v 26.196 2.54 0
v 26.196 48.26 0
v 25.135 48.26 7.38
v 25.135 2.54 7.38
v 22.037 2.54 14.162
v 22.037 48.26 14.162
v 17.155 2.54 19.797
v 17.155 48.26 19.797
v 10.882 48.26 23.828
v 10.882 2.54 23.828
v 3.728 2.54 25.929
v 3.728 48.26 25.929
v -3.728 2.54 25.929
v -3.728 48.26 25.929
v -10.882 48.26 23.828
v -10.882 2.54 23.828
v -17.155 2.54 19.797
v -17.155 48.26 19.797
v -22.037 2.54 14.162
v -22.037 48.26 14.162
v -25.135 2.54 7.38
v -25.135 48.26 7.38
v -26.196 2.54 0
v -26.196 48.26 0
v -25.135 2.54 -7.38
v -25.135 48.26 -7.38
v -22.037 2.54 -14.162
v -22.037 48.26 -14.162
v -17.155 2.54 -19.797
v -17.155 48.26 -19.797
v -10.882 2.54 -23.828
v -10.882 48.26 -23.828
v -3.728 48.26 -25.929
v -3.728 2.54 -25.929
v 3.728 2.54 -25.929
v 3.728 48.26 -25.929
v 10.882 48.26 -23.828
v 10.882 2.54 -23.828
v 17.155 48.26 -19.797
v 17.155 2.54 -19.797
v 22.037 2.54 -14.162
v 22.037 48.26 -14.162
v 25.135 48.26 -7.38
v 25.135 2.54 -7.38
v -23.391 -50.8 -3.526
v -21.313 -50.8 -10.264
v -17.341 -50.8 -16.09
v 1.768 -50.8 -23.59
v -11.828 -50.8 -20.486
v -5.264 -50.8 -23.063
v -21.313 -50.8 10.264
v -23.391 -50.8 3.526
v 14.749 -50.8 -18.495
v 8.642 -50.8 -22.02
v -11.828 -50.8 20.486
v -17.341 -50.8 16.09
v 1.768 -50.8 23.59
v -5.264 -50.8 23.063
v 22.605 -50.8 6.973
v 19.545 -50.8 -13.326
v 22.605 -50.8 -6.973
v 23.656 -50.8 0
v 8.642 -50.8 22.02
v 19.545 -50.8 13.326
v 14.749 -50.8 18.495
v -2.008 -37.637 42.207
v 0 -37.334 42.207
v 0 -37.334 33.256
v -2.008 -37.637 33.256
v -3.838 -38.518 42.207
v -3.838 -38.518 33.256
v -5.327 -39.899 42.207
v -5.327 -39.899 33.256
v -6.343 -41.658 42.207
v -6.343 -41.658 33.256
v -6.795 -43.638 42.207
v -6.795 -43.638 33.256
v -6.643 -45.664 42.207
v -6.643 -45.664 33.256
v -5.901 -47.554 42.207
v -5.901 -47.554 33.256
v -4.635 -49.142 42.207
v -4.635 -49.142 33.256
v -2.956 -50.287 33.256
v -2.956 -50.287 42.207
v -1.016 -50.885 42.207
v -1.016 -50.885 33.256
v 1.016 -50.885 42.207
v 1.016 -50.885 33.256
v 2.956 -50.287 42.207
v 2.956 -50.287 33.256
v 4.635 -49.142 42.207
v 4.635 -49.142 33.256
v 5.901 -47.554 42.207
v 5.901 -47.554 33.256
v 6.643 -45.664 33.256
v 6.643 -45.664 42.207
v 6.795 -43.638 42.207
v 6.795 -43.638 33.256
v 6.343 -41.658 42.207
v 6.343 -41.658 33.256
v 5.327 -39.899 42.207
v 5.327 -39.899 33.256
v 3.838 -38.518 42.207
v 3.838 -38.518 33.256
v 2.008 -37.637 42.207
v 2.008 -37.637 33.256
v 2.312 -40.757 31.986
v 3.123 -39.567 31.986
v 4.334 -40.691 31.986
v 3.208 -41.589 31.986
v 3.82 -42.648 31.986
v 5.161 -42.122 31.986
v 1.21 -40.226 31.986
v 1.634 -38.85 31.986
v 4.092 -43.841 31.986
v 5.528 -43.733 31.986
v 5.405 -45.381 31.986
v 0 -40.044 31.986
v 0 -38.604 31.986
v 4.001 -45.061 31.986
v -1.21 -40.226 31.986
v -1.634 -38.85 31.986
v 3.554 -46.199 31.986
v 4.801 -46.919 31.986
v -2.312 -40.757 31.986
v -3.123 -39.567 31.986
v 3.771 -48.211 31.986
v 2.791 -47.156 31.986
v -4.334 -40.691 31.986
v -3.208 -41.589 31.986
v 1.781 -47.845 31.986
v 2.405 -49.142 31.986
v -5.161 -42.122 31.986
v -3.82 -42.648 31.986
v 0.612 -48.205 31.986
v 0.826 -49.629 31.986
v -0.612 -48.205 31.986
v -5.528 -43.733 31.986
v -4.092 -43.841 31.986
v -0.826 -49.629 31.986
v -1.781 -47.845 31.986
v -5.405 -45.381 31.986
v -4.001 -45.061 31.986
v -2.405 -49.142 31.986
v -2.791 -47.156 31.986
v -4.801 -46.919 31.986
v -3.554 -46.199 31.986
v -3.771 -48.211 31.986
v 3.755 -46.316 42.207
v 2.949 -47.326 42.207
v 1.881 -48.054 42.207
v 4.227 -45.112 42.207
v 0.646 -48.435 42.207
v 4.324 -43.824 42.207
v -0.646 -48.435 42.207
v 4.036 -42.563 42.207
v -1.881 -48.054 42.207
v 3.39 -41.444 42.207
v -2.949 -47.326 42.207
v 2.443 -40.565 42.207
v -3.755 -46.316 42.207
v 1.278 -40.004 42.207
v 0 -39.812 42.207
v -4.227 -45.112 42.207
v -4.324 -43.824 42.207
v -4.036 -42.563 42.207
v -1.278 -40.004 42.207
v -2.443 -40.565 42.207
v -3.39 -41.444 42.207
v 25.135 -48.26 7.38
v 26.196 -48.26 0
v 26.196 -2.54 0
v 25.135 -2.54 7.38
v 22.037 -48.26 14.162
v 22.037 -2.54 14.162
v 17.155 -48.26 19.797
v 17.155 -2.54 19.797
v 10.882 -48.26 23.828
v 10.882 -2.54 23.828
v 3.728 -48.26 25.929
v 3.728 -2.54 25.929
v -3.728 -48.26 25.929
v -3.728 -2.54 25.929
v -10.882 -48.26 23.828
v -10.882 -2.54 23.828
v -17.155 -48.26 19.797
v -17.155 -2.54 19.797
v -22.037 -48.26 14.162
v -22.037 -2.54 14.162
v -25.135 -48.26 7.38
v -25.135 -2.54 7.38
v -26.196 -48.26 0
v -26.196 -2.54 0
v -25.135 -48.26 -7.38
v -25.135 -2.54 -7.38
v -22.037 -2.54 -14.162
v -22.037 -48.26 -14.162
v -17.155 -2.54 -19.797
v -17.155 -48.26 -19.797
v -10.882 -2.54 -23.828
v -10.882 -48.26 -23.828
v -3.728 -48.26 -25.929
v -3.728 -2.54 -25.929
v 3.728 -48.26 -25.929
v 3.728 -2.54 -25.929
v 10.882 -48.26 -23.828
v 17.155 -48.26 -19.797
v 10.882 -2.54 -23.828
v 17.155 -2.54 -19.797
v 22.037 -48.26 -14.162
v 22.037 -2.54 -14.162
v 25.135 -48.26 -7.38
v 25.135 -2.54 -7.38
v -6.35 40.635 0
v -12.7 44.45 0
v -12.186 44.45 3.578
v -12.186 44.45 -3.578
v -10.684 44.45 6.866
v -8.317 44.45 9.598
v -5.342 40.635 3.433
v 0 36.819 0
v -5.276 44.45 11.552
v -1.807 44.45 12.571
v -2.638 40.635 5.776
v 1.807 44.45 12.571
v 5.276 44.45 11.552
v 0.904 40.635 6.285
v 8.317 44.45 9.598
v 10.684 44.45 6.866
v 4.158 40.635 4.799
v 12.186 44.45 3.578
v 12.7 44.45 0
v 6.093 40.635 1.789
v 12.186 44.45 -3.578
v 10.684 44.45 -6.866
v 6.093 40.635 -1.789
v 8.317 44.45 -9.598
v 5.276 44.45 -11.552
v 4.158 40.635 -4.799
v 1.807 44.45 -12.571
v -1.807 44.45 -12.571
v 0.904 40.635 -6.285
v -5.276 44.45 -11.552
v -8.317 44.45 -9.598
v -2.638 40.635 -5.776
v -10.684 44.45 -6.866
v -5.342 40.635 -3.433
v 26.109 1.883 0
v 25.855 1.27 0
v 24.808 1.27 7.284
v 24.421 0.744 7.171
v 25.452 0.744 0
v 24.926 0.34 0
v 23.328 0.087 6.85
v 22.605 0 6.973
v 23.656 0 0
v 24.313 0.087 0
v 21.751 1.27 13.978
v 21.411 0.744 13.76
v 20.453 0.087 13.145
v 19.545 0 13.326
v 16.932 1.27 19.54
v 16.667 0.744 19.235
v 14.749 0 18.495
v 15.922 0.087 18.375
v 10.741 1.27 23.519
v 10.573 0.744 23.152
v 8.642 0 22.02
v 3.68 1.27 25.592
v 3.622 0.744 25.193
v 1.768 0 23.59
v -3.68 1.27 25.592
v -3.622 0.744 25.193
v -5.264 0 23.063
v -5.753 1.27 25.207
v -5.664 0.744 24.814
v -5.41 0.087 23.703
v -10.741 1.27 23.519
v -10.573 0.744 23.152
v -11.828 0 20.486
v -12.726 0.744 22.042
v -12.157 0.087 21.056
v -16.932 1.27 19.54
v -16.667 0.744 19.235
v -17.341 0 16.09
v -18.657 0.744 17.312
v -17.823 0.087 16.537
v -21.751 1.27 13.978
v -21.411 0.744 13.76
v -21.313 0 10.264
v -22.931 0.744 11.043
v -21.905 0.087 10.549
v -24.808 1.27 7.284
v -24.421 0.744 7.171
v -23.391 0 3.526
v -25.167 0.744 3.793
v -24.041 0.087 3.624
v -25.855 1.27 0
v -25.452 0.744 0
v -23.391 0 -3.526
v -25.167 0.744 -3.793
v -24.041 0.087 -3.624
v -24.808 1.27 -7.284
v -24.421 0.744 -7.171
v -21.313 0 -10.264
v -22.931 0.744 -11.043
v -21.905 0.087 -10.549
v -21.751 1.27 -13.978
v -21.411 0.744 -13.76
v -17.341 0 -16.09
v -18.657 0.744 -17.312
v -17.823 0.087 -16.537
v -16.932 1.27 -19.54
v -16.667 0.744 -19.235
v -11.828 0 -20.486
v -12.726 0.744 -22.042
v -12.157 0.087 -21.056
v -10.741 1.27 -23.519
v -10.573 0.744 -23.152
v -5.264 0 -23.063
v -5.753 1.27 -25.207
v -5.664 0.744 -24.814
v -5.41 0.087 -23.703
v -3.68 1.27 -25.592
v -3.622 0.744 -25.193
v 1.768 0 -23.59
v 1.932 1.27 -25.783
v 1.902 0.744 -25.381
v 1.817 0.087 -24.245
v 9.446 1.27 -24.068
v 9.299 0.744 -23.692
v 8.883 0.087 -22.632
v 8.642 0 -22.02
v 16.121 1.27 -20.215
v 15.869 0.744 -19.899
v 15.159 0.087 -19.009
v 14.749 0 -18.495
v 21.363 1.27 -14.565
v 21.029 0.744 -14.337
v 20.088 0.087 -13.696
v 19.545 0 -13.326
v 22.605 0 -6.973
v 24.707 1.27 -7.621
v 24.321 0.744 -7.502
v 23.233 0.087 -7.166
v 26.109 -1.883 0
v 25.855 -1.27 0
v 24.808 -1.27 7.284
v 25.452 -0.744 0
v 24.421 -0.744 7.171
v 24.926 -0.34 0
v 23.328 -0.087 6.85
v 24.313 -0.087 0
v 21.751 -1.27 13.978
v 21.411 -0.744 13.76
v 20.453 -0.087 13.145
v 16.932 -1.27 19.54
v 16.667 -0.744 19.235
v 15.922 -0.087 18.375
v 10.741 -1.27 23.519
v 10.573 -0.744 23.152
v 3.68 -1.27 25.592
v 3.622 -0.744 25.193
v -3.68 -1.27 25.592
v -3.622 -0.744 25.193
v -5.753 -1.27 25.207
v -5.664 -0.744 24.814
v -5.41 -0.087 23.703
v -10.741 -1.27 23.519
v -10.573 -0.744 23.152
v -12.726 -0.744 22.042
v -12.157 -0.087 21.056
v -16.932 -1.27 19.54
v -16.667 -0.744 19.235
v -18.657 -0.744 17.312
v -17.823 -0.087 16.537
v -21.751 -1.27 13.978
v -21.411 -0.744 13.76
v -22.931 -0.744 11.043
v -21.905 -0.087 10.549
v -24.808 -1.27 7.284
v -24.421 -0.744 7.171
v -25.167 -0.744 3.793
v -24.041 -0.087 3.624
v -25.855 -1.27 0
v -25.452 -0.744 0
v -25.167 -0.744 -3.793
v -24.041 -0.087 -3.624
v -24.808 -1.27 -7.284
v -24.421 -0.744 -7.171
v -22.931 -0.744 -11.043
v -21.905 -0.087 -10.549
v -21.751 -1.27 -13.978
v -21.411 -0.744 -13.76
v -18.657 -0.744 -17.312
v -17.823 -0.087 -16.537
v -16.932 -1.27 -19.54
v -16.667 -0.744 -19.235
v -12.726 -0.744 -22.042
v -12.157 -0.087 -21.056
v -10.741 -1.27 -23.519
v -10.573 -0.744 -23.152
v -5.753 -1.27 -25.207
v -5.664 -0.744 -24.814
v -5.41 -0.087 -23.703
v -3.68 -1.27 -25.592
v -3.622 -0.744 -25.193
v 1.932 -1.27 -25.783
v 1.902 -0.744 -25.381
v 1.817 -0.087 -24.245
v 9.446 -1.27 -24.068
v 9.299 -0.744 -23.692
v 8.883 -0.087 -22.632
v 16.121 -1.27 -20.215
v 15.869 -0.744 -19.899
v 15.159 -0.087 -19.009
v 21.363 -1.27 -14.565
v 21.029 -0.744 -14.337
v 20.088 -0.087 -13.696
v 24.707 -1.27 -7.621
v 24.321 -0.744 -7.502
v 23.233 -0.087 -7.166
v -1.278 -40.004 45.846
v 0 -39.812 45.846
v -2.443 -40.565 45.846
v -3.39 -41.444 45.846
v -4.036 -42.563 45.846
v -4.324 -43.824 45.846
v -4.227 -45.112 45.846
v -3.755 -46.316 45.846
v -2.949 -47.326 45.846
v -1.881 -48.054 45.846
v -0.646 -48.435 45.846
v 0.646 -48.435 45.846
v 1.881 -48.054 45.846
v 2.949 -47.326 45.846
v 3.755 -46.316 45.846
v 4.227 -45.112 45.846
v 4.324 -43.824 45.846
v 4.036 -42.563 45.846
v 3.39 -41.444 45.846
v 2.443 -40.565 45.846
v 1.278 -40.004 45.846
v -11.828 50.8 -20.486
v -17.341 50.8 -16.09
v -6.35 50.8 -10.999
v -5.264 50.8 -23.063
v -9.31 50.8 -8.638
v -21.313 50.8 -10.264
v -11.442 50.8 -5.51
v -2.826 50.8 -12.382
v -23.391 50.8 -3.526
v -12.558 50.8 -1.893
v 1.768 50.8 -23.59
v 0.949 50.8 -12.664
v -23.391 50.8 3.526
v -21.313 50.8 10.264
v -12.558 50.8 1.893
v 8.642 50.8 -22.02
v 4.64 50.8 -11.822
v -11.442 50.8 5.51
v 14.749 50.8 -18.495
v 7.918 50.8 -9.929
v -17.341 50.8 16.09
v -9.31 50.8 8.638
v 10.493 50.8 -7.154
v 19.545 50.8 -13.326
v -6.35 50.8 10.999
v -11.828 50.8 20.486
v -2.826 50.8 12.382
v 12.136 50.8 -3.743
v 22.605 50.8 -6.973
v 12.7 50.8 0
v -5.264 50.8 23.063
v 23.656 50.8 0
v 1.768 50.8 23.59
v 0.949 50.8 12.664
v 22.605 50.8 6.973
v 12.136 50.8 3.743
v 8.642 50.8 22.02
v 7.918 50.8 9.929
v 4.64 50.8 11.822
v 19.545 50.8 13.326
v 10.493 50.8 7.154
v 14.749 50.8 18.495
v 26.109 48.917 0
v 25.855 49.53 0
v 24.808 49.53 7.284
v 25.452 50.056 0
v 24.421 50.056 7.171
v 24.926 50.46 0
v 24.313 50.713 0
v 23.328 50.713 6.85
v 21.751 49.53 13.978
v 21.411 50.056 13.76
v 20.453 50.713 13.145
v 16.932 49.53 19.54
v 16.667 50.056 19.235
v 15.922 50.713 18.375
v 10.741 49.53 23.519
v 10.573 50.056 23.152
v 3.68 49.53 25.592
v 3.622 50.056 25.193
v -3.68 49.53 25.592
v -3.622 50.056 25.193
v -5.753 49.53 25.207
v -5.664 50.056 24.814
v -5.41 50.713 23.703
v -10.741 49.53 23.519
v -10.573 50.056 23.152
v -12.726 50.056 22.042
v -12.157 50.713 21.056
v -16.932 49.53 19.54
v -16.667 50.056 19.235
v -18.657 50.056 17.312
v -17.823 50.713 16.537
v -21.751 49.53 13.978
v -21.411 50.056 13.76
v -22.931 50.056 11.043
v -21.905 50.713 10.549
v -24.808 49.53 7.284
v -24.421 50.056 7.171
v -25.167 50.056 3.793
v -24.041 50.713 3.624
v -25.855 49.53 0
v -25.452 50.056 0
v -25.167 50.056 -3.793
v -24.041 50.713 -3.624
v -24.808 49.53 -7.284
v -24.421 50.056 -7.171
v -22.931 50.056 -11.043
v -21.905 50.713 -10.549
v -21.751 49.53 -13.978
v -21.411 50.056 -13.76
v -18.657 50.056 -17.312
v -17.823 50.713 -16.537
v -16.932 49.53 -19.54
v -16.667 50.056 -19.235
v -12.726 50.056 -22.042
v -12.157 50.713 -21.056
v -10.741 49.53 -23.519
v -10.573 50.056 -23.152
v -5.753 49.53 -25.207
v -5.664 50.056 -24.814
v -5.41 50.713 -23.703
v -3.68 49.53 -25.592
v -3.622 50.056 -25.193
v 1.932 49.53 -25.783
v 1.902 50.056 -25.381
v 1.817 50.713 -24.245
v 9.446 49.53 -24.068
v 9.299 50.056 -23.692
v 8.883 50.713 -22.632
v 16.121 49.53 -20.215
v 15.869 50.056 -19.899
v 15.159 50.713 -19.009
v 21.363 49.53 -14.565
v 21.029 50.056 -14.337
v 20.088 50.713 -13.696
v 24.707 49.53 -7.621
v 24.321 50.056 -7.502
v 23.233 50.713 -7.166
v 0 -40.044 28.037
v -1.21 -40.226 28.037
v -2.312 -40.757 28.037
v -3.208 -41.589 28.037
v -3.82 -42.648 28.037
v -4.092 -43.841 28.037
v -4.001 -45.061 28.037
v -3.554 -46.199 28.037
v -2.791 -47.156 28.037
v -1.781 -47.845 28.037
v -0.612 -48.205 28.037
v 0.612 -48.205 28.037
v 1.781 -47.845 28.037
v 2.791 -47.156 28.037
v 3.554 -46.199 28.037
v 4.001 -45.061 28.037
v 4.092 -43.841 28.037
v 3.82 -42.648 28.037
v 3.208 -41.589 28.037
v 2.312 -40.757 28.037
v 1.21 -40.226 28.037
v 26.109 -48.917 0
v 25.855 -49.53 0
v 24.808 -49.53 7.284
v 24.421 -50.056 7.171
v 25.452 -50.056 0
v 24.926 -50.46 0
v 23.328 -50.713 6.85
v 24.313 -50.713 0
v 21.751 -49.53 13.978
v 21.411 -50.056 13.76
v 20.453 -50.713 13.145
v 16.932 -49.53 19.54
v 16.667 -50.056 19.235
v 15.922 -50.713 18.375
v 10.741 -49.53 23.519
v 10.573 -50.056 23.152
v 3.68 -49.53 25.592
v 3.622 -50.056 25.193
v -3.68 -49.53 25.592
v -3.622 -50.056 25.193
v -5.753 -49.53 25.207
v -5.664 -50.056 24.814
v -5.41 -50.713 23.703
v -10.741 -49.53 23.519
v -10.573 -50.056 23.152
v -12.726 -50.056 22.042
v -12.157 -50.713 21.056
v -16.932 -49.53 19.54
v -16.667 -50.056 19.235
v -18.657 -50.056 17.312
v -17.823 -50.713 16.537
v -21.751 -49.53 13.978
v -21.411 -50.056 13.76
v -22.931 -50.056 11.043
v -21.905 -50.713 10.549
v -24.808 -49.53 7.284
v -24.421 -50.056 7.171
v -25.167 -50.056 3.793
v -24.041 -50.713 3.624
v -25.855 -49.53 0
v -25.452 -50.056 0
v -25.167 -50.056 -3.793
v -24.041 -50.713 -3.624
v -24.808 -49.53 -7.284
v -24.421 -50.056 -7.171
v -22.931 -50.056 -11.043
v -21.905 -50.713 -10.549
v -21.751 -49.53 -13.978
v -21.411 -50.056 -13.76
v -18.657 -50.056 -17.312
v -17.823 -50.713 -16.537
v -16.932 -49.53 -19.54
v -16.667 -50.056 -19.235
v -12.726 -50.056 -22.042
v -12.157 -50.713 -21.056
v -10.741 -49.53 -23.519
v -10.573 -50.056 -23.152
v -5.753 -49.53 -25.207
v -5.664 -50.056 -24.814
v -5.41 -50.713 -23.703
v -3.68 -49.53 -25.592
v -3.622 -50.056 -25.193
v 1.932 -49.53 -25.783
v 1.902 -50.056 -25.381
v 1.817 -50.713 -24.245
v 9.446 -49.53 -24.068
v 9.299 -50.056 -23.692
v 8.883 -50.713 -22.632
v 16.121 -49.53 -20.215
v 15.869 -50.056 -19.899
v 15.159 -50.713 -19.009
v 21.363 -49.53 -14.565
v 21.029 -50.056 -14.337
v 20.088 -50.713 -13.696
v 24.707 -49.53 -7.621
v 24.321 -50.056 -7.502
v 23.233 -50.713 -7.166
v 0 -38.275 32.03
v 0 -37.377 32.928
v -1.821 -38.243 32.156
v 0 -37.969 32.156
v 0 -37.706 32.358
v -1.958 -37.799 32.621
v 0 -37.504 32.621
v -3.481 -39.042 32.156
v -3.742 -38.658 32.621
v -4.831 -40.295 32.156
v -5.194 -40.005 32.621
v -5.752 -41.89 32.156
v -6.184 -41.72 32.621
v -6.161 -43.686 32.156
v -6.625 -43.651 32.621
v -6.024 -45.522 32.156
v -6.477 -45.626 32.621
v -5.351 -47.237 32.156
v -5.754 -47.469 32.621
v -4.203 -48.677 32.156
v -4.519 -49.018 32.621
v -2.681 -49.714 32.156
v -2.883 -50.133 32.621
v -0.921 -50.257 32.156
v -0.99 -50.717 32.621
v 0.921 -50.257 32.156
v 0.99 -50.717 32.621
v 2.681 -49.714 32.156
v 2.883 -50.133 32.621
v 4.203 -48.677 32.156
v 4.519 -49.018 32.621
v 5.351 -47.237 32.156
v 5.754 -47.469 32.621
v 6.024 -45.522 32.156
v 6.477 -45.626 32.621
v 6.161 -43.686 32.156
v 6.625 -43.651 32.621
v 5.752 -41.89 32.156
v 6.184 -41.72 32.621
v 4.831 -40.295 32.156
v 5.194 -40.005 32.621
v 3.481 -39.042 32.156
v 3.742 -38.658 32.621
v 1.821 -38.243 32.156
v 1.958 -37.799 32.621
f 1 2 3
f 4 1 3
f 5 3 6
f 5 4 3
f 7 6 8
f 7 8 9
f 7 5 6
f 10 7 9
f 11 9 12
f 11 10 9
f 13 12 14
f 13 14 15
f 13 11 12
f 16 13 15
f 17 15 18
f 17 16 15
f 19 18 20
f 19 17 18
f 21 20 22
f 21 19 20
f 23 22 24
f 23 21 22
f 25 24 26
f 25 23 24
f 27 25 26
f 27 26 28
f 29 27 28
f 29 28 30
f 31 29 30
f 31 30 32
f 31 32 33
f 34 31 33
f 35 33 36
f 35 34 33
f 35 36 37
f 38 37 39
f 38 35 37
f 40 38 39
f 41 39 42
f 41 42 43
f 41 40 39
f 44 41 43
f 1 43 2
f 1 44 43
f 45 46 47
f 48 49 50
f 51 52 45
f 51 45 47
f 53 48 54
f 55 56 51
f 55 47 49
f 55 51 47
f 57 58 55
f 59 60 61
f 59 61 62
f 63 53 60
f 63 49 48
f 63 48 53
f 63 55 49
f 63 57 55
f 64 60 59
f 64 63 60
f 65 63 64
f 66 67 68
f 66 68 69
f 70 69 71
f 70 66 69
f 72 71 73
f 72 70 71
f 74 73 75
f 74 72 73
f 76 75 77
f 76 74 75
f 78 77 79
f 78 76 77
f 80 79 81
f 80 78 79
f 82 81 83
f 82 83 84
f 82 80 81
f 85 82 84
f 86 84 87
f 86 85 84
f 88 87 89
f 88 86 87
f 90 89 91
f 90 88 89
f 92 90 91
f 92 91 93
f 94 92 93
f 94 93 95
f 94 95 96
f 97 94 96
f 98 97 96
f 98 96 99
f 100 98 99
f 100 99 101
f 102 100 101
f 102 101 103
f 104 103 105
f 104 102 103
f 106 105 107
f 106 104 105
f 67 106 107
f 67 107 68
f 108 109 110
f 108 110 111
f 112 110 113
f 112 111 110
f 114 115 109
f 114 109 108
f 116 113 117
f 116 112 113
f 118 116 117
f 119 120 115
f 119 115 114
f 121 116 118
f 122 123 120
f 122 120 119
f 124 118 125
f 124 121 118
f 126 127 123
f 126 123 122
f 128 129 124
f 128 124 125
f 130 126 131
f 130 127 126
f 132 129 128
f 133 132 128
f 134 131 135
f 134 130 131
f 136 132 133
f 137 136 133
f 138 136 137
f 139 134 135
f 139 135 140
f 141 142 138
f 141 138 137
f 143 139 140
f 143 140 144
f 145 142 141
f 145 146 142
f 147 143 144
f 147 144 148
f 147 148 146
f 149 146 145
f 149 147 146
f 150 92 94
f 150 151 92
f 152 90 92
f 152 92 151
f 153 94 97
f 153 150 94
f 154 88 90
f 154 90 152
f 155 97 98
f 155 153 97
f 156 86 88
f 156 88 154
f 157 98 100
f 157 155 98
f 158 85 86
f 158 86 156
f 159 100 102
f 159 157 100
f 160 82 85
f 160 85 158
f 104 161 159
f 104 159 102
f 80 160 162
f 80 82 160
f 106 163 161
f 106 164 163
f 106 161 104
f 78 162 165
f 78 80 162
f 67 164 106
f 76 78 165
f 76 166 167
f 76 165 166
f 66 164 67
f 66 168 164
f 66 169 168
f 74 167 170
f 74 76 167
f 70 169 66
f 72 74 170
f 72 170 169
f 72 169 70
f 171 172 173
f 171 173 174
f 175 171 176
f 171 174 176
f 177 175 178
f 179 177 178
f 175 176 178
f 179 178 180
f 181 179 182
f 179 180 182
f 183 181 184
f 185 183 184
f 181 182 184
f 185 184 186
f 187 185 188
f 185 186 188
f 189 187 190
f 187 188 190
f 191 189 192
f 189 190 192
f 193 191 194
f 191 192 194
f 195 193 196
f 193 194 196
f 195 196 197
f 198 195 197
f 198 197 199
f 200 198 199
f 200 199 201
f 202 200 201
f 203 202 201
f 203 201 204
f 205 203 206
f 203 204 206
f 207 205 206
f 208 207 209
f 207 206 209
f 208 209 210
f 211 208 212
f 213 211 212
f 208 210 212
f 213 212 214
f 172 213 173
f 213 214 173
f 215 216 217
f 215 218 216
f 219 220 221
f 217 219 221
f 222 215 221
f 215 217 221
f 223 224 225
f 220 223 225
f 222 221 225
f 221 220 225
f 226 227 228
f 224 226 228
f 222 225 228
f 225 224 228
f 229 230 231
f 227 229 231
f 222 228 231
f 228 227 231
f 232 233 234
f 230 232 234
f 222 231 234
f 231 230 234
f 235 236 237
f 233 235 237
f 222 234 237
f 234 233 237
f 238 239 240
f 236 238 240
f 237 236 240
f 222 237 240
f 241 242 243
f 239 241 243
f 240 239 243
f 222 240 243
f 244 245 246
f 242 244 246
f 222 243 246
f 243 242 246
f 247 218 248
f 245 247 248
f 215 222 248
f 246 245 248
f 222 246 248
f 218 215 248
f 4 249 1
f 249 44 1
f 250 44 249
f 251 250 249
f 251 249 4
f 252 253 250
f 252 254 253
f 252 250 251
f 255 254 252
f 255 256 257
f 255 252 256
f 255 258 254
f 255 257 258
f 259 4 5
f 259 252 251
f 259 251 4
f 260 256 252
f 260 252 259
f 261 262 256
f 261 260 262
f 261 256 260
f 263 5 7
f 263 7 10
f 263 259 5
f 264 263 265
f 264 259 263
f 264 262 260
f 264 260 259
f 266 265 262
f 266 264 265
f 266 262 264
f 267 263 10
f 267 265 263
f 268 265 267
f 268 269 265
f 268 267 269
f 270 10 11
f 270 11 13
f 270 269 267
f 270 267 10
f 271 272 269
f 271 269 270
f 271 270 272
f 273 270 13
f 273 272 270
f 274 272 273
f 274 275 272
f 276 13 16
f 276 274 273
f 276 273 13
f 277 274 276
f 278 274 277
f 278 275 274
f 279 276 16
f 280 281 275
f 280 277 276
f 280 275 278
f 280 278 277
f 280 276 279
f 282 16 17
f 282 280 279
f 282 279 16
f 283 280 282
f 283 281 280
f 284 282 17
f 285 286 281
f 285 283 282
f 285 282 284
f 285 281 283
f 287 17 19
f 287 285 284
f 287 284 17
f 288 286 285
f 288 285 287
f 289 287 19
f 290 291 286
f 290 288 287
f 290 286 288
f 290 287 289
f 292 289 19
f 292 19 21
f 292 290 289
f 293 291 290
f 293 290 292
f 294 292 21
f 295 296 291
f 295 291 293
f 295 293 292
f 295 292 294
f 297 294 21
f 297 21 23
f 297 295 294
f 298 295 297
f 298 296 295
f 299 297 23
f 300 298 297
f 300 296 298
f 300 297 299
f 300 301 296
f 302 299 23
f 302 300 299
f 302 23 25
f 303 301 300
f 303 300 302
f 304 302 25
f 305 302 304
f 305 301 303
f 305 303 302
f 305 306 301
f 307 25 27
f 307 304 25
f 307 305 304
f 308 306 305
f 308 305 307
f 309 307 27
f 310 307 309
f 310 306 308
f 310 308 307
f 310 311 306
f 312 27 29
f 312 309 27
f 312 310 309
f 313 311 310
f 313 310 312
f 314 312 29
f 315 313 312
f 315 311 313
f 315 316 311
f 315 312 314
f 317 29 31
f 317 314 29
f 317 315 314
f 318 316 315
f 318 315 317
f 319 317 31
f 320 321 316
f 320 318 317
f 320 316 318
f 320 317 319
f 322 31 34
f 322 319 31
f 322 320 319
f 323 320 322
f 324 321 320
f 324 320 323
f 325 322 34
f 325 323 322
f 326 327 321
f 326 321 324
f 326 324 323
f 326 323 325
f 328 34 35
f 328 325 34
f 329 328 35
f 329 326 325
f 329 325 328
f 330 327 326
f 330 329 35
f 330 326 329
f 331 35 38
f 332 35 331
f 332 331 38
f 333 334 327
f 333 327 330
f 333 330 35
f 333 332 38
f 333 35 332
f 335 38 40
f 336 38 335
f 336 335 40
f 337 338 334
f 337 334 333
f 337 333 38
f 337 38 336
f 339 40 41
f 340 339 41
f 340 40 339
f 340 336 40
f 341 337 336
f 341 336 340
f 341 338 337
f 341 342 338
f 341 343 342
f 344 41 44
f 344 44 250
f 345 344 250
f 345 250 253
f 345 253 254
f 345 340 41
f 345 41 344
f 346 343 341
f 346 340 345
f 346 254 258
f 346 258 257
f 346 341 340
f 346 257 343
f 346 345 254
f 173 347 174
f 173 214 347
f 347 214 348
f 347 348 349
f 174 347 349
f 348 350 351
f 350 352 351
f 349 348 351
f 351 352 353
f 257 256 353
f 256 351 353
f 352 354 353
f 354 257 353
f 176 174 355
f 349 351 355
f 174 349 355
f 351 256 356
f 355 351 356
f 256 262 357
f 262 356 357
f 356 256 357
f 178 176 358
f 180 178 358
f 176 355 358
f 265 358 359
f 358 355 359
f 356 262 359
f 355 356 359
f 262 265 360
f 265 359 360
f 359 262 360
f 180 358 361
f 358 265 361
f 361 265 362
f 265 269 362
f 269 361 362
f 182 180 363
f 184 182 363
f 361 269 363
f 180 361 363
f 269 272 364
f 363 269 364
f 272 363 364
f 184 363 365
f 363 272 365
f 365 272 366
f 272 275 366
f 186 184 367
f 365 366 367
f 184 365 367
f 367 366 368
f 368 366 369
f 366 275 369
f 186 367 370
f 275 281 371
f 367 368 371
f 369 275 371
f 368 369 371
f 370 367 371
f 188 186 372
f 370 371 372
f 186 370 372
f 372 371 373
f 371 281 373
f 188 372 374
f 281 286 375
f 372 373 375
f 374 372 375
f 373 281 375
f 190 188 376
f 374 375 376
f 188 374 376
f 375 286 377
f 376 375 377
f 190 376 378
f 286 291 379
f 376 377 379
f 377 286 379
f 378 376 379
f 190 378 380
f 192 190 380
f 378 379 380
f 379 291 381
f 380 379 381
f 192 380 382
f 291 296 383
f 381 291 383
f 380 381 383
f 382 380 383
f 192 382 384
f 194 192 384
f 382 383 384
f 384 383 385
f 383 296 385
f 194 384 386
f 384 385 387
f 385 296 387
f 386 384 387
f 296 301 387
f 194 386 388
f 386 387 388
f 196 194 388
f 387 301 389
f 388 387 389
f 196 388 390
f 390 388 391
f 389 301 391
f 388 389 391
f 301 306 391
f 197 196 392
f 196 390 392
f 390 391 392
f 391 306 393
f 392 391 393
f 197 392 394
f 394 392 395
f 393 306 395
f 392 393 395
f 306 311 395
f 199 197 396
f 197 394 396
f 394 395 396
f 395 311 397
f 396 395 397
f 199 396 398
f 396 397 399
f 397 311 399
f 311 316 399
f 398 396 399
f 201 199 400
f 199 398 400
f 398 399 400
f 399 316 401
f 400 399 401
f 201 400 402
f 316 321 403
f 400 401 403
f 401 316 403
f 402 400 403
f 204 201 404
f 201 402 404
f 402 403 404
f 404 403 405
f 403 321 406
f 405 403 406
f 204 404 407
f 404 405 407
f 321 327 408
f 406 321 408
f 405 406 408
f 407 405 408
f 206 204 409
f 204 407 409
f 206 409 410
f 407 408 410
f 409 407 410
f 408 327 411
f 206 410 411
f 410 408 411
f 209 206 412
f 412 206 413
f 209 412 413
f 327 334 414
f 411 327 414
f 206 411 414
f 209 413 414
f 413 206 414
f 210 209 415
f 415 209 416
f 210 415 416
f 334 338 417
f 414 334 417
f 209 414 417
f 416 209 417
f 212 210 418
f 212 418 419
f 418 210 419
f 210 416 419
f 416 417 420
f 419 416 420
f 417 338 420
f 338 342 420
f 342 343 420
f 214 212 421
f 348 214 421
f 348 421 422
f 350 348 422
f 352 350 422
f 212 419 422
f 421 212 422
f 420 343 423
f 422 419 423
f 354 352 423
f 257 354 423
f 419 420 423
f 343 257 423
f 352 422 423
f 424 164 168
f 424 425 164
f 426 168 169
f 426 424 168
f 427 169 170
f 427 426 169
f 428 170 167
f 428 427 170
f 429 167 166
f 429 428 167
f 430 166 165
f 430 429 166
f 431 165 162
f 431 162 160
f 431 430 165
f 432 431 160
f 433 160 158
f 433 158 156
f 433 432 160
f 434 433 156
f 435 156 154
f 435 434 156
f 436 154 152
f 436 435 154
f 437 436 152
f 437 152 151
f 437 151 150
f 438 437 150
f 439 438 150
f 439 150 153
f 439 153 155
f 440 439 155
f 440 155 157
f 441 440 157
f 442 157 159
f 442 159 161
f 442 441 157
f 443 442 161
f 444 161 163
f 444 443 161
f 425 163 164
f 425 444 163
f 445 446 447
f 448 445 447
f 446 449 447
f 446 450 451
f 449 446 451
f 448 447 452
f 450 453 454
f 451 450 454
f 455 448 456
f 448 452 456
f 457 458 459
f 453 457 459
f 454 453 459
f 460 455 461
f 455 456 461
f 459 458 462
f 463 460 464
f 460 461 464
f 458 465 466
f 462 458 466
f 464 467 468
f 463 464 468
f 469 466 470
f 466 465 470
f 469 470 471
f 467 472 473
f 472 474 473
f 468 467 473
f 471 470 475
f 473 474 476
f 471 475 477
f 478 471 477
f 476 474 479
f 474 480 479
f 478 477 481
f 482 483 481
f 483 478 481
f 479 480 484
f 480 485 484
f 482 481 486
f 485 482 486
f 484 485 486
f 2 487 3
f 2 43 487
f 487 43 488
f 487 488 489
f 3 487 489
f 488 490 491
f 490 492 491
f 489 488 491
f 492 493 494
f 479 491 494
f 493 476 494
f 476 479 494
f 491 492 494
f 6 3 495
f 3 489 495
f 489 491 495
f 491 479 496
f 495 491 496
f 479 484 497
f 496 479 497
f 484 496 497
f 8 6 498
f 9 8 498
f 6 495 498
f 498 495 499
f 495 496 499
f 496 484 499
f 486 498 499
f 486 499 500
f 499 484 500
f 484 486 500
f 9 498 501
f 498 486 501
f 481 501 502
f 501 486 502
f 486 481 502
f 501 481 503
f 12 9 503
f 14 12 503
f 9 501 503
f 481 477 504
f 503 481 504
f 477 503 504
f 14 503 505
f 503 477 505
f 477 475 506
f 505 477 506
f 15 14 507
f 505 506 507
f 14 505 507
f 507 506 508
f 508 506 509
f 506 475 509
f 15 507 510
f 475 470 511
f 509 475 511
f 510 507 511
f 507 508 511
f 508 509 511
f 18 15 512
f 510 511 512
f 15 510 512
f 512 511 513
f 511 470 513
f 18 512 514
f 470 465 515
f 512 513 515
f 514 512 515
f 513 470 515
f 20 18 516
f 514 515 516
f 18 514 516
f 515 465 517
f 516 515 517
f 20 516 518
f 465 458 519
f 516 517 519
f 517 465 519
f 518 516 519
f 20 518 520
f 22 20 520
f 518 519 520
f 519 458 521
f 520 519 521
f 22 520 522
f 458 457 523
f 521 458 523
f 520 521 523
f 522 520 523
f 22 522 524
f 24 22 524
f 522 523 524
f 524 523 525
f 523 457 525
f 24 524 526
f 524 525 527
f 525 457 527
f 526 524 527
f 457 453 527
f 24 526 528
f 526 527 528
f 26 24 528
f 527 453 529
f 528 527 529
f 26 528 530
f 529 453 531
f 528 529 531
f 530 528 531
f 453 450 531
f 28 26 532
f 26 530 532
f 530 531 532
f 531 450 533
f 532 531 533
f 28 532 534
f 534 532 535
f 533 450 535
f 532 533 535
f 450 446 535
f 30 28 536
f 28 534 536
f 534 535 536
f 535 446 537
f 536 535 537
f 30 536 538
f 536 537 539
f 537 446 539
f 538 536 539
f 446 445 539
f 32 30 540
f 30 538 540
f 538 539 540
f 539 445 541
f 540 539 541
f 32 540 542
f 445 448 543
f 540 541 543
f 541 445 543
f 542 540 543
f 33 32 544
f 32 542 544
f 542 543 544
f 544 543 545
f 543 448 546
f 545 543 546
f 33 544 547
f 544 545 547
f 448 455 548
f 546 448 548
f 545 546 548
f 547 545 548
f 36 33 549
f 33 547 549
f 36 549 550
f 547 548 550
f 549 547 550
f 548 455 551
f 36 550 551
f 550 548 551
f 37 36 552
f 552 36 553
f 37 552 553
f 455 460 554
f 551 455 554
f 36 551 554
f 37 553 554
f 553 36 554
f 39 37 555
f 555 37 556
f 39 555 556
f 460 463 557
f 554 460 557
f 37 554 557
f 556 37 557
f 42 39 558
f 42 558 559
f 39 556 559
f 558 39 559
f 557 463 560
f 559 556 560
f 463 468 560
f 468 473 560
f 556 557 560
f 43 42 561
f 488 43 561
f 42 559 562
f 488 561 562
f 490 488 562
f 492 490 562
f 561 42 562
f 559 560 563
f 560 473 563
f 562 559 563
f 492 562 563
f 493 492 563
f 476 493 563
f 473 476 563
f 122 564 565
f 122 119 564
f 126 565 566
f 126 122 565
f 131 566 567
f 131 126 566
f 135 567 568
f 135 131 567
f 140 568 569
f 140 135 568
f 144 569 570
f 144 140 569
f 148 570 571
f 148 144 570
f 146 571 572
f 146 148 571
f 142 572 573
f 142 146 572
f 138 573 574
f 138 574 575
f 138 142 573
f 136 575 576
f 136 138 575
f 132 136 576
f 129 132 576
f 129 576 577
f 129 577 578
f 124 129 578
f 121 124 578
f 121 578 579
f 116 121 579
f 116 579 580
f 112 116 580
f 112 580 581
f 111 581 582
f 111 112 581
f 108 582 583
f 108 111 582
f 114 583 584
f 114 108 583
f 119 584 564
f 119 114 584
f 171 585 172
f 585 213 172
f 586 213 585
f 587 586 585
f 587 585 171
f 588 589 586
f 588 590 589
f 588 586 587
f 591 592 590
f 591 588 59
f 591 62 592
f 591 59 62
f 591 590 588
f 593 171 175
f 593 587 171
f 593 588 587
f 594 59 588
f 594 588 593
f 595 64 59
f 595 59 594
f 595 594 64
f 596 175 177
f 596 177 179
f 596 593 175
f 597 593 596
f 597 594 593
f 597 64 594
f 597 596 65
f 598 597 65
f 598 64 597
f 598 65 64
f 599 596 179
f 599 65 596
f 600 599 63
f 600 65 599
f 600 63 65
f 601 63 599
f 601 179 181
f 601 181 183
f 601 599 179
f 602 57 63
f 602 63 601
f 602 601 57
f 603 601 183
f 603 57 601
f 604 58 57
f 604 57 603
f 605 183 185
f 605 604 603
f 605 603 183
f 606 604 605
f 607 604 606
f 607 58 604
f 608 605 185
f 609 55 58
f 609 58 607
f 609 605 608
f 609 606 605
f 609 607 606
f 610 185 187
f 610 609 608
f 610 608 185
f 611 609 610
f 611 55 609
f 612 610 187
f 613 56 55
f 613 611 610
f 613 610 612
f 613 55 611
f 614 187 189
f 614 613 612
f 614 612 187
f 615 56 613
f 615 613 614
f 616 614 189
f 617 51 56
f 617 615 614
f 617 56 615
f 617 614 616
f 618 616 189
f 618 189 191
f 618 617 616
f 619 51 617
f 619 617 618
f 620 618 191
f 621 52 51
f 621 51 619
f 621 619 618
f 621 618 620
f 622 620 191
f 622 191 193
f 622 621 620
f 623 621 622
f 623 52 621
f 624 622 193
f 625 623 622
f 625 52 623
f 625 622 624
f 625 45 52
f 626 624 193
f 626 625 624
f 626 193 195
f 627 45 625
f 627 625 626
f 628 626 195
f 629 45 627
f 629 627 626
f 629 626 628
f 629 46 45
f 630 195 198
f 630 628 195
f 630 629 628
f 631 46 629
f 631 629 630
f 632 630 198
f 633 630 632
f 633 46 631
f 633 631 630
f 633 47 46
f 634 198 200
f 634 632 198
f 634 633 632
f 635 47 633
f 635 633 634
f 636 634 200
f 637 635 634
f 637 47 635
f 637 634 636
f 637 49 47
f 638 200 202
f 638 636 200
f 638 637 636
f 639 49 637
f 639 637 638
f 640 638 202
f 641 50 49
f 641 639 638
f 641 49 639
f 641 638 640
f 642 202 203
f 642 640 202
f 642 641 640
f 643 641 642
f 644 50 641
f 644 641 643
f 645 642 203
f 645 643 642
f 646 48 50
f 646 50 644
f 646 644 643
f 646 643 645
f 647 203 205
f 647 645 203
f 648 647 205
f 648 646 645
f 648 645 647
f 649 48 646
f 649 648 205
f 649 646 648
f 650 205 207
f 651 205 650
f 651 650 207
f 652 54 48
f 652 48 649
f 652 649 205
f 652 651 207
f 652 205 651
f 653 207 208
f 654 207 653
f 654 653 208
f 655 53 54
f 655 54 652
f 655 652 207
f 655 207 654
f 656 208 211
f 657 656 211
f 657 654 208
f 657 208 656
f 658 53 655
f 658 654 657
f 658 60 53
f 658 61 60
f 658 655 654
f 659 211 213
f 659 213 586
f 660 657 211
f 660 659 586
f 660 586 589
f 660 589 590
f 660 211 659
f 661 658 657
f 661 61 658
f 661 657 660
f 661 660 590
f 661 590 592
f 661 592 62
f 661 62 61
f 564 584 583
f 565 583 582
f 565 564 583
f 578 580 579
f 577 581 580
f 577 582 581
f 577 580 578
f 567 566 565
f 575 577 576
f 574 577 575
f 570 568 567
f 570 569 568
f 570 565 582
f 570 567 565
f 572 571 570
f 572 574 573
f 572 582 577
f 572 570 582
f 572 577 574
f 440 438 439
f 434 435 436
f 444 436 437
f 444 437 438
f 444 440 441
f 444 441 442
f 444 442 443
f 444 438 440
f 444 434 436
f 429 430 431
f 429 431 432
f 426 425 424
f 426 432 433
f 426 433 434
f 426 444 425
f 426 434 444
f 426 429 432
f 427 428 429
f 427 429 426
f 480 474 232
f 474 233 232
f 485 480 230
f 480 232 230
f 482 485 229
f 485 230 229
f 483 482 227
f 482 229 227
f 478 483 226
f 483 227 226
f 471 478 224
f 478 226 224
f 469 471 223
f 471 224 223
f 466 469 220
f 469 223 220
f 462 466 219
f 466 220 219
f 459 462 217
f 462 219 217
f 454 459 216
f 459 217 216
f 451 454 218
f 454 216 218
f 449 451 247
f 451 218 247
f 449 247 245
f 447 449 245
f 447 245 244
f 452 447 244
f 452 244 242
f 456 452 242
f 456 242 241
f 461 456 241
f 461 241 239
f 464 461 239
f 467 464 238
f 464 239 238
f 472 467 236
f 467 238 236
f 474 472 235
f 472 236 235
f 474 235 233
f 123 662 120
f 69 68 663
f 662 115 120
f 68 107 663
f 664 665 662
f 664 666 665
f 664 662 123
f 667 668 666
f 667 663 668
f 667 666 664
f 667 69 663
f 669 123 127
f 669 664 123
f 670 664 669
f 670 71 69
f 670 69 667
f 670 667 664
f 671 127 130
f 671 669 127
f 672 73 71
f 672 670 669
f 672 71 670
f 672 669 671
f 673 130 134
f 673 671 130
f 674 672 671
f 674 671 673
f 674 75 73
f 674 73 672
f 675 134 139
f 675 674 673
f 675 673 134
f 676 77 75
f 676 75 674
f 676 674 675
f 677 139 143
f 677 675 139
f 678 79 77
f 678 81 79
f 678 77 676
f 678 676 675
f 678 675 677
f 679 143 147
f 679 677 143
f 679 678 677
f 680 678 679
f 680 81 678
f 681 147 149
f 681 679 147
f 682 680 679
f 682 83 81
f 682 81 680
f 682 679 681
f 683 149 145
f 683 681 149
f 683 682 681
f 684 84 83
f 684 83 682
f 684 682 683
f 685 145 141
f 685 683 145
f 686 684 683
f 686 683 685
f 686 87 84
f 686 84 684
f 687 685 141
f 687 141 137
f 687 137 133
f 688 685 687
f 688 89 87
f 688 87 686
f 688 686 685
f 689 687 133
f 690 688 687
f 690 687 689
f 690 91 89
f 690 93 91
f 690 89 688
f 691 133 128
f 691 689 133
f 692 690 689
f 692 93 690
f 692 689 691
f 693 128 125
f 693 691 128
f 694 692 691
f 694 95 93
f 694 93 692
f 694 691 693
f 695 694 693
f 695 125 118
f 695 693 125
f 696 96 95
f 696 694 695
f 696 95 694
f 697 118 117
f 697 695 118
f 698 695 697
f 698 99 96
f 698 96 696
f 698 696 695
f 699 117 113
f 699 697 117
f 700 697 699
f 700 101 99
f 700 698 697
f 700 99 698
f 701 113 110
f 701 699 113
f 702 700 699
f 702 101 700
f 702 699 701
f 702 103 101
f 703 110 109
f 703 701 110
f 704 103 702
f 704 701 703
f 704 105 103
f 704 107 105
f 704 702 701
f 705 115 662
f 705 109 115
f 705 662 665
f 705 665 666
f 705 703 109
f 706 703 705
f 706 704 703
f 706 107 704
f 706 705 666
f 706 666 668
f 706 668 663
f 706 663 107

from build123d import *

# Parameters (mm, degrees)
F0_R     = 26.1956504321
F1_DEPTH = 50.8
F2_R     = 2.54
F6_R     = 1.27
F8_D     = 25.4
F8_DEPTH = 6.35
F8_TIP   = 7.6309298617


with BuildPart() as f1:
    # F0 (on Front) → F1 (new body)
    with BuildSketch(Plane.XZ):
        Circle(F0_R)
    extrude(amount=-F1_DEPTH)

    # F2
    f2_edges = [f1.edges().sort_by_distance(p)[0] for p in [
        (26.19565, 25.4, 0),
        (-26.19565, 0, 0),
        (-26.19565, 50.8, 0),
    ]]
    fillet(f2_edges, radius=F2_R)

    # F3: F1 across plane


with BuildPart() as f1_1:
    add(f1.part)
    add(f1.part.mirror(Plane.XZ))

    # F8
    with Locations(Plane(origin=(0, 50.8, 0), x_dir=(-1, 0, 0), z_dir=(0, 1, 0))):
        with Locations((0, 0)):
            Hole(F8_D / 2, depth=F8_DEPTH)
            with Locations((0, 0, -(F8_DEPTH + F8_TIP / 2))):  # 118° drill point
                Cone(0, F8_D / 2, F8_TIP, mode=Mode.SUBTRACT)


with BuildPart() as f5:
    # F4 (on Right) → F5 (revolve)
    with BuildSketch(Plane.YZ):
        Polygon((-39.8115739226, 45.846093446), (-44.1475957632, 45.846093446), (-44.1475957632, 28.0374214053), (-43.462857604, 28.0374214053), (-40.0438606739, 28.0374214053), (-40.0438606739, 31.9863036275), (-37.3338460922, 31.9863036275), (-37.3338460922, 42.2069318593), (-39.8115739226, 42.2069318593), align=None)
    revolve(axis=Axis((0, -44.1475957632, 36.9417574257), (0, 0, 1)))

    # F6
    f6_edges = [f5.edges().sort_by_distance(p)[0] for p in [
        (0, -50.961345, 31.986304),
    ]]
    fillet(f6_edges, radius=F6_R)


solid = Compound([f1_1.part, f5.part])
